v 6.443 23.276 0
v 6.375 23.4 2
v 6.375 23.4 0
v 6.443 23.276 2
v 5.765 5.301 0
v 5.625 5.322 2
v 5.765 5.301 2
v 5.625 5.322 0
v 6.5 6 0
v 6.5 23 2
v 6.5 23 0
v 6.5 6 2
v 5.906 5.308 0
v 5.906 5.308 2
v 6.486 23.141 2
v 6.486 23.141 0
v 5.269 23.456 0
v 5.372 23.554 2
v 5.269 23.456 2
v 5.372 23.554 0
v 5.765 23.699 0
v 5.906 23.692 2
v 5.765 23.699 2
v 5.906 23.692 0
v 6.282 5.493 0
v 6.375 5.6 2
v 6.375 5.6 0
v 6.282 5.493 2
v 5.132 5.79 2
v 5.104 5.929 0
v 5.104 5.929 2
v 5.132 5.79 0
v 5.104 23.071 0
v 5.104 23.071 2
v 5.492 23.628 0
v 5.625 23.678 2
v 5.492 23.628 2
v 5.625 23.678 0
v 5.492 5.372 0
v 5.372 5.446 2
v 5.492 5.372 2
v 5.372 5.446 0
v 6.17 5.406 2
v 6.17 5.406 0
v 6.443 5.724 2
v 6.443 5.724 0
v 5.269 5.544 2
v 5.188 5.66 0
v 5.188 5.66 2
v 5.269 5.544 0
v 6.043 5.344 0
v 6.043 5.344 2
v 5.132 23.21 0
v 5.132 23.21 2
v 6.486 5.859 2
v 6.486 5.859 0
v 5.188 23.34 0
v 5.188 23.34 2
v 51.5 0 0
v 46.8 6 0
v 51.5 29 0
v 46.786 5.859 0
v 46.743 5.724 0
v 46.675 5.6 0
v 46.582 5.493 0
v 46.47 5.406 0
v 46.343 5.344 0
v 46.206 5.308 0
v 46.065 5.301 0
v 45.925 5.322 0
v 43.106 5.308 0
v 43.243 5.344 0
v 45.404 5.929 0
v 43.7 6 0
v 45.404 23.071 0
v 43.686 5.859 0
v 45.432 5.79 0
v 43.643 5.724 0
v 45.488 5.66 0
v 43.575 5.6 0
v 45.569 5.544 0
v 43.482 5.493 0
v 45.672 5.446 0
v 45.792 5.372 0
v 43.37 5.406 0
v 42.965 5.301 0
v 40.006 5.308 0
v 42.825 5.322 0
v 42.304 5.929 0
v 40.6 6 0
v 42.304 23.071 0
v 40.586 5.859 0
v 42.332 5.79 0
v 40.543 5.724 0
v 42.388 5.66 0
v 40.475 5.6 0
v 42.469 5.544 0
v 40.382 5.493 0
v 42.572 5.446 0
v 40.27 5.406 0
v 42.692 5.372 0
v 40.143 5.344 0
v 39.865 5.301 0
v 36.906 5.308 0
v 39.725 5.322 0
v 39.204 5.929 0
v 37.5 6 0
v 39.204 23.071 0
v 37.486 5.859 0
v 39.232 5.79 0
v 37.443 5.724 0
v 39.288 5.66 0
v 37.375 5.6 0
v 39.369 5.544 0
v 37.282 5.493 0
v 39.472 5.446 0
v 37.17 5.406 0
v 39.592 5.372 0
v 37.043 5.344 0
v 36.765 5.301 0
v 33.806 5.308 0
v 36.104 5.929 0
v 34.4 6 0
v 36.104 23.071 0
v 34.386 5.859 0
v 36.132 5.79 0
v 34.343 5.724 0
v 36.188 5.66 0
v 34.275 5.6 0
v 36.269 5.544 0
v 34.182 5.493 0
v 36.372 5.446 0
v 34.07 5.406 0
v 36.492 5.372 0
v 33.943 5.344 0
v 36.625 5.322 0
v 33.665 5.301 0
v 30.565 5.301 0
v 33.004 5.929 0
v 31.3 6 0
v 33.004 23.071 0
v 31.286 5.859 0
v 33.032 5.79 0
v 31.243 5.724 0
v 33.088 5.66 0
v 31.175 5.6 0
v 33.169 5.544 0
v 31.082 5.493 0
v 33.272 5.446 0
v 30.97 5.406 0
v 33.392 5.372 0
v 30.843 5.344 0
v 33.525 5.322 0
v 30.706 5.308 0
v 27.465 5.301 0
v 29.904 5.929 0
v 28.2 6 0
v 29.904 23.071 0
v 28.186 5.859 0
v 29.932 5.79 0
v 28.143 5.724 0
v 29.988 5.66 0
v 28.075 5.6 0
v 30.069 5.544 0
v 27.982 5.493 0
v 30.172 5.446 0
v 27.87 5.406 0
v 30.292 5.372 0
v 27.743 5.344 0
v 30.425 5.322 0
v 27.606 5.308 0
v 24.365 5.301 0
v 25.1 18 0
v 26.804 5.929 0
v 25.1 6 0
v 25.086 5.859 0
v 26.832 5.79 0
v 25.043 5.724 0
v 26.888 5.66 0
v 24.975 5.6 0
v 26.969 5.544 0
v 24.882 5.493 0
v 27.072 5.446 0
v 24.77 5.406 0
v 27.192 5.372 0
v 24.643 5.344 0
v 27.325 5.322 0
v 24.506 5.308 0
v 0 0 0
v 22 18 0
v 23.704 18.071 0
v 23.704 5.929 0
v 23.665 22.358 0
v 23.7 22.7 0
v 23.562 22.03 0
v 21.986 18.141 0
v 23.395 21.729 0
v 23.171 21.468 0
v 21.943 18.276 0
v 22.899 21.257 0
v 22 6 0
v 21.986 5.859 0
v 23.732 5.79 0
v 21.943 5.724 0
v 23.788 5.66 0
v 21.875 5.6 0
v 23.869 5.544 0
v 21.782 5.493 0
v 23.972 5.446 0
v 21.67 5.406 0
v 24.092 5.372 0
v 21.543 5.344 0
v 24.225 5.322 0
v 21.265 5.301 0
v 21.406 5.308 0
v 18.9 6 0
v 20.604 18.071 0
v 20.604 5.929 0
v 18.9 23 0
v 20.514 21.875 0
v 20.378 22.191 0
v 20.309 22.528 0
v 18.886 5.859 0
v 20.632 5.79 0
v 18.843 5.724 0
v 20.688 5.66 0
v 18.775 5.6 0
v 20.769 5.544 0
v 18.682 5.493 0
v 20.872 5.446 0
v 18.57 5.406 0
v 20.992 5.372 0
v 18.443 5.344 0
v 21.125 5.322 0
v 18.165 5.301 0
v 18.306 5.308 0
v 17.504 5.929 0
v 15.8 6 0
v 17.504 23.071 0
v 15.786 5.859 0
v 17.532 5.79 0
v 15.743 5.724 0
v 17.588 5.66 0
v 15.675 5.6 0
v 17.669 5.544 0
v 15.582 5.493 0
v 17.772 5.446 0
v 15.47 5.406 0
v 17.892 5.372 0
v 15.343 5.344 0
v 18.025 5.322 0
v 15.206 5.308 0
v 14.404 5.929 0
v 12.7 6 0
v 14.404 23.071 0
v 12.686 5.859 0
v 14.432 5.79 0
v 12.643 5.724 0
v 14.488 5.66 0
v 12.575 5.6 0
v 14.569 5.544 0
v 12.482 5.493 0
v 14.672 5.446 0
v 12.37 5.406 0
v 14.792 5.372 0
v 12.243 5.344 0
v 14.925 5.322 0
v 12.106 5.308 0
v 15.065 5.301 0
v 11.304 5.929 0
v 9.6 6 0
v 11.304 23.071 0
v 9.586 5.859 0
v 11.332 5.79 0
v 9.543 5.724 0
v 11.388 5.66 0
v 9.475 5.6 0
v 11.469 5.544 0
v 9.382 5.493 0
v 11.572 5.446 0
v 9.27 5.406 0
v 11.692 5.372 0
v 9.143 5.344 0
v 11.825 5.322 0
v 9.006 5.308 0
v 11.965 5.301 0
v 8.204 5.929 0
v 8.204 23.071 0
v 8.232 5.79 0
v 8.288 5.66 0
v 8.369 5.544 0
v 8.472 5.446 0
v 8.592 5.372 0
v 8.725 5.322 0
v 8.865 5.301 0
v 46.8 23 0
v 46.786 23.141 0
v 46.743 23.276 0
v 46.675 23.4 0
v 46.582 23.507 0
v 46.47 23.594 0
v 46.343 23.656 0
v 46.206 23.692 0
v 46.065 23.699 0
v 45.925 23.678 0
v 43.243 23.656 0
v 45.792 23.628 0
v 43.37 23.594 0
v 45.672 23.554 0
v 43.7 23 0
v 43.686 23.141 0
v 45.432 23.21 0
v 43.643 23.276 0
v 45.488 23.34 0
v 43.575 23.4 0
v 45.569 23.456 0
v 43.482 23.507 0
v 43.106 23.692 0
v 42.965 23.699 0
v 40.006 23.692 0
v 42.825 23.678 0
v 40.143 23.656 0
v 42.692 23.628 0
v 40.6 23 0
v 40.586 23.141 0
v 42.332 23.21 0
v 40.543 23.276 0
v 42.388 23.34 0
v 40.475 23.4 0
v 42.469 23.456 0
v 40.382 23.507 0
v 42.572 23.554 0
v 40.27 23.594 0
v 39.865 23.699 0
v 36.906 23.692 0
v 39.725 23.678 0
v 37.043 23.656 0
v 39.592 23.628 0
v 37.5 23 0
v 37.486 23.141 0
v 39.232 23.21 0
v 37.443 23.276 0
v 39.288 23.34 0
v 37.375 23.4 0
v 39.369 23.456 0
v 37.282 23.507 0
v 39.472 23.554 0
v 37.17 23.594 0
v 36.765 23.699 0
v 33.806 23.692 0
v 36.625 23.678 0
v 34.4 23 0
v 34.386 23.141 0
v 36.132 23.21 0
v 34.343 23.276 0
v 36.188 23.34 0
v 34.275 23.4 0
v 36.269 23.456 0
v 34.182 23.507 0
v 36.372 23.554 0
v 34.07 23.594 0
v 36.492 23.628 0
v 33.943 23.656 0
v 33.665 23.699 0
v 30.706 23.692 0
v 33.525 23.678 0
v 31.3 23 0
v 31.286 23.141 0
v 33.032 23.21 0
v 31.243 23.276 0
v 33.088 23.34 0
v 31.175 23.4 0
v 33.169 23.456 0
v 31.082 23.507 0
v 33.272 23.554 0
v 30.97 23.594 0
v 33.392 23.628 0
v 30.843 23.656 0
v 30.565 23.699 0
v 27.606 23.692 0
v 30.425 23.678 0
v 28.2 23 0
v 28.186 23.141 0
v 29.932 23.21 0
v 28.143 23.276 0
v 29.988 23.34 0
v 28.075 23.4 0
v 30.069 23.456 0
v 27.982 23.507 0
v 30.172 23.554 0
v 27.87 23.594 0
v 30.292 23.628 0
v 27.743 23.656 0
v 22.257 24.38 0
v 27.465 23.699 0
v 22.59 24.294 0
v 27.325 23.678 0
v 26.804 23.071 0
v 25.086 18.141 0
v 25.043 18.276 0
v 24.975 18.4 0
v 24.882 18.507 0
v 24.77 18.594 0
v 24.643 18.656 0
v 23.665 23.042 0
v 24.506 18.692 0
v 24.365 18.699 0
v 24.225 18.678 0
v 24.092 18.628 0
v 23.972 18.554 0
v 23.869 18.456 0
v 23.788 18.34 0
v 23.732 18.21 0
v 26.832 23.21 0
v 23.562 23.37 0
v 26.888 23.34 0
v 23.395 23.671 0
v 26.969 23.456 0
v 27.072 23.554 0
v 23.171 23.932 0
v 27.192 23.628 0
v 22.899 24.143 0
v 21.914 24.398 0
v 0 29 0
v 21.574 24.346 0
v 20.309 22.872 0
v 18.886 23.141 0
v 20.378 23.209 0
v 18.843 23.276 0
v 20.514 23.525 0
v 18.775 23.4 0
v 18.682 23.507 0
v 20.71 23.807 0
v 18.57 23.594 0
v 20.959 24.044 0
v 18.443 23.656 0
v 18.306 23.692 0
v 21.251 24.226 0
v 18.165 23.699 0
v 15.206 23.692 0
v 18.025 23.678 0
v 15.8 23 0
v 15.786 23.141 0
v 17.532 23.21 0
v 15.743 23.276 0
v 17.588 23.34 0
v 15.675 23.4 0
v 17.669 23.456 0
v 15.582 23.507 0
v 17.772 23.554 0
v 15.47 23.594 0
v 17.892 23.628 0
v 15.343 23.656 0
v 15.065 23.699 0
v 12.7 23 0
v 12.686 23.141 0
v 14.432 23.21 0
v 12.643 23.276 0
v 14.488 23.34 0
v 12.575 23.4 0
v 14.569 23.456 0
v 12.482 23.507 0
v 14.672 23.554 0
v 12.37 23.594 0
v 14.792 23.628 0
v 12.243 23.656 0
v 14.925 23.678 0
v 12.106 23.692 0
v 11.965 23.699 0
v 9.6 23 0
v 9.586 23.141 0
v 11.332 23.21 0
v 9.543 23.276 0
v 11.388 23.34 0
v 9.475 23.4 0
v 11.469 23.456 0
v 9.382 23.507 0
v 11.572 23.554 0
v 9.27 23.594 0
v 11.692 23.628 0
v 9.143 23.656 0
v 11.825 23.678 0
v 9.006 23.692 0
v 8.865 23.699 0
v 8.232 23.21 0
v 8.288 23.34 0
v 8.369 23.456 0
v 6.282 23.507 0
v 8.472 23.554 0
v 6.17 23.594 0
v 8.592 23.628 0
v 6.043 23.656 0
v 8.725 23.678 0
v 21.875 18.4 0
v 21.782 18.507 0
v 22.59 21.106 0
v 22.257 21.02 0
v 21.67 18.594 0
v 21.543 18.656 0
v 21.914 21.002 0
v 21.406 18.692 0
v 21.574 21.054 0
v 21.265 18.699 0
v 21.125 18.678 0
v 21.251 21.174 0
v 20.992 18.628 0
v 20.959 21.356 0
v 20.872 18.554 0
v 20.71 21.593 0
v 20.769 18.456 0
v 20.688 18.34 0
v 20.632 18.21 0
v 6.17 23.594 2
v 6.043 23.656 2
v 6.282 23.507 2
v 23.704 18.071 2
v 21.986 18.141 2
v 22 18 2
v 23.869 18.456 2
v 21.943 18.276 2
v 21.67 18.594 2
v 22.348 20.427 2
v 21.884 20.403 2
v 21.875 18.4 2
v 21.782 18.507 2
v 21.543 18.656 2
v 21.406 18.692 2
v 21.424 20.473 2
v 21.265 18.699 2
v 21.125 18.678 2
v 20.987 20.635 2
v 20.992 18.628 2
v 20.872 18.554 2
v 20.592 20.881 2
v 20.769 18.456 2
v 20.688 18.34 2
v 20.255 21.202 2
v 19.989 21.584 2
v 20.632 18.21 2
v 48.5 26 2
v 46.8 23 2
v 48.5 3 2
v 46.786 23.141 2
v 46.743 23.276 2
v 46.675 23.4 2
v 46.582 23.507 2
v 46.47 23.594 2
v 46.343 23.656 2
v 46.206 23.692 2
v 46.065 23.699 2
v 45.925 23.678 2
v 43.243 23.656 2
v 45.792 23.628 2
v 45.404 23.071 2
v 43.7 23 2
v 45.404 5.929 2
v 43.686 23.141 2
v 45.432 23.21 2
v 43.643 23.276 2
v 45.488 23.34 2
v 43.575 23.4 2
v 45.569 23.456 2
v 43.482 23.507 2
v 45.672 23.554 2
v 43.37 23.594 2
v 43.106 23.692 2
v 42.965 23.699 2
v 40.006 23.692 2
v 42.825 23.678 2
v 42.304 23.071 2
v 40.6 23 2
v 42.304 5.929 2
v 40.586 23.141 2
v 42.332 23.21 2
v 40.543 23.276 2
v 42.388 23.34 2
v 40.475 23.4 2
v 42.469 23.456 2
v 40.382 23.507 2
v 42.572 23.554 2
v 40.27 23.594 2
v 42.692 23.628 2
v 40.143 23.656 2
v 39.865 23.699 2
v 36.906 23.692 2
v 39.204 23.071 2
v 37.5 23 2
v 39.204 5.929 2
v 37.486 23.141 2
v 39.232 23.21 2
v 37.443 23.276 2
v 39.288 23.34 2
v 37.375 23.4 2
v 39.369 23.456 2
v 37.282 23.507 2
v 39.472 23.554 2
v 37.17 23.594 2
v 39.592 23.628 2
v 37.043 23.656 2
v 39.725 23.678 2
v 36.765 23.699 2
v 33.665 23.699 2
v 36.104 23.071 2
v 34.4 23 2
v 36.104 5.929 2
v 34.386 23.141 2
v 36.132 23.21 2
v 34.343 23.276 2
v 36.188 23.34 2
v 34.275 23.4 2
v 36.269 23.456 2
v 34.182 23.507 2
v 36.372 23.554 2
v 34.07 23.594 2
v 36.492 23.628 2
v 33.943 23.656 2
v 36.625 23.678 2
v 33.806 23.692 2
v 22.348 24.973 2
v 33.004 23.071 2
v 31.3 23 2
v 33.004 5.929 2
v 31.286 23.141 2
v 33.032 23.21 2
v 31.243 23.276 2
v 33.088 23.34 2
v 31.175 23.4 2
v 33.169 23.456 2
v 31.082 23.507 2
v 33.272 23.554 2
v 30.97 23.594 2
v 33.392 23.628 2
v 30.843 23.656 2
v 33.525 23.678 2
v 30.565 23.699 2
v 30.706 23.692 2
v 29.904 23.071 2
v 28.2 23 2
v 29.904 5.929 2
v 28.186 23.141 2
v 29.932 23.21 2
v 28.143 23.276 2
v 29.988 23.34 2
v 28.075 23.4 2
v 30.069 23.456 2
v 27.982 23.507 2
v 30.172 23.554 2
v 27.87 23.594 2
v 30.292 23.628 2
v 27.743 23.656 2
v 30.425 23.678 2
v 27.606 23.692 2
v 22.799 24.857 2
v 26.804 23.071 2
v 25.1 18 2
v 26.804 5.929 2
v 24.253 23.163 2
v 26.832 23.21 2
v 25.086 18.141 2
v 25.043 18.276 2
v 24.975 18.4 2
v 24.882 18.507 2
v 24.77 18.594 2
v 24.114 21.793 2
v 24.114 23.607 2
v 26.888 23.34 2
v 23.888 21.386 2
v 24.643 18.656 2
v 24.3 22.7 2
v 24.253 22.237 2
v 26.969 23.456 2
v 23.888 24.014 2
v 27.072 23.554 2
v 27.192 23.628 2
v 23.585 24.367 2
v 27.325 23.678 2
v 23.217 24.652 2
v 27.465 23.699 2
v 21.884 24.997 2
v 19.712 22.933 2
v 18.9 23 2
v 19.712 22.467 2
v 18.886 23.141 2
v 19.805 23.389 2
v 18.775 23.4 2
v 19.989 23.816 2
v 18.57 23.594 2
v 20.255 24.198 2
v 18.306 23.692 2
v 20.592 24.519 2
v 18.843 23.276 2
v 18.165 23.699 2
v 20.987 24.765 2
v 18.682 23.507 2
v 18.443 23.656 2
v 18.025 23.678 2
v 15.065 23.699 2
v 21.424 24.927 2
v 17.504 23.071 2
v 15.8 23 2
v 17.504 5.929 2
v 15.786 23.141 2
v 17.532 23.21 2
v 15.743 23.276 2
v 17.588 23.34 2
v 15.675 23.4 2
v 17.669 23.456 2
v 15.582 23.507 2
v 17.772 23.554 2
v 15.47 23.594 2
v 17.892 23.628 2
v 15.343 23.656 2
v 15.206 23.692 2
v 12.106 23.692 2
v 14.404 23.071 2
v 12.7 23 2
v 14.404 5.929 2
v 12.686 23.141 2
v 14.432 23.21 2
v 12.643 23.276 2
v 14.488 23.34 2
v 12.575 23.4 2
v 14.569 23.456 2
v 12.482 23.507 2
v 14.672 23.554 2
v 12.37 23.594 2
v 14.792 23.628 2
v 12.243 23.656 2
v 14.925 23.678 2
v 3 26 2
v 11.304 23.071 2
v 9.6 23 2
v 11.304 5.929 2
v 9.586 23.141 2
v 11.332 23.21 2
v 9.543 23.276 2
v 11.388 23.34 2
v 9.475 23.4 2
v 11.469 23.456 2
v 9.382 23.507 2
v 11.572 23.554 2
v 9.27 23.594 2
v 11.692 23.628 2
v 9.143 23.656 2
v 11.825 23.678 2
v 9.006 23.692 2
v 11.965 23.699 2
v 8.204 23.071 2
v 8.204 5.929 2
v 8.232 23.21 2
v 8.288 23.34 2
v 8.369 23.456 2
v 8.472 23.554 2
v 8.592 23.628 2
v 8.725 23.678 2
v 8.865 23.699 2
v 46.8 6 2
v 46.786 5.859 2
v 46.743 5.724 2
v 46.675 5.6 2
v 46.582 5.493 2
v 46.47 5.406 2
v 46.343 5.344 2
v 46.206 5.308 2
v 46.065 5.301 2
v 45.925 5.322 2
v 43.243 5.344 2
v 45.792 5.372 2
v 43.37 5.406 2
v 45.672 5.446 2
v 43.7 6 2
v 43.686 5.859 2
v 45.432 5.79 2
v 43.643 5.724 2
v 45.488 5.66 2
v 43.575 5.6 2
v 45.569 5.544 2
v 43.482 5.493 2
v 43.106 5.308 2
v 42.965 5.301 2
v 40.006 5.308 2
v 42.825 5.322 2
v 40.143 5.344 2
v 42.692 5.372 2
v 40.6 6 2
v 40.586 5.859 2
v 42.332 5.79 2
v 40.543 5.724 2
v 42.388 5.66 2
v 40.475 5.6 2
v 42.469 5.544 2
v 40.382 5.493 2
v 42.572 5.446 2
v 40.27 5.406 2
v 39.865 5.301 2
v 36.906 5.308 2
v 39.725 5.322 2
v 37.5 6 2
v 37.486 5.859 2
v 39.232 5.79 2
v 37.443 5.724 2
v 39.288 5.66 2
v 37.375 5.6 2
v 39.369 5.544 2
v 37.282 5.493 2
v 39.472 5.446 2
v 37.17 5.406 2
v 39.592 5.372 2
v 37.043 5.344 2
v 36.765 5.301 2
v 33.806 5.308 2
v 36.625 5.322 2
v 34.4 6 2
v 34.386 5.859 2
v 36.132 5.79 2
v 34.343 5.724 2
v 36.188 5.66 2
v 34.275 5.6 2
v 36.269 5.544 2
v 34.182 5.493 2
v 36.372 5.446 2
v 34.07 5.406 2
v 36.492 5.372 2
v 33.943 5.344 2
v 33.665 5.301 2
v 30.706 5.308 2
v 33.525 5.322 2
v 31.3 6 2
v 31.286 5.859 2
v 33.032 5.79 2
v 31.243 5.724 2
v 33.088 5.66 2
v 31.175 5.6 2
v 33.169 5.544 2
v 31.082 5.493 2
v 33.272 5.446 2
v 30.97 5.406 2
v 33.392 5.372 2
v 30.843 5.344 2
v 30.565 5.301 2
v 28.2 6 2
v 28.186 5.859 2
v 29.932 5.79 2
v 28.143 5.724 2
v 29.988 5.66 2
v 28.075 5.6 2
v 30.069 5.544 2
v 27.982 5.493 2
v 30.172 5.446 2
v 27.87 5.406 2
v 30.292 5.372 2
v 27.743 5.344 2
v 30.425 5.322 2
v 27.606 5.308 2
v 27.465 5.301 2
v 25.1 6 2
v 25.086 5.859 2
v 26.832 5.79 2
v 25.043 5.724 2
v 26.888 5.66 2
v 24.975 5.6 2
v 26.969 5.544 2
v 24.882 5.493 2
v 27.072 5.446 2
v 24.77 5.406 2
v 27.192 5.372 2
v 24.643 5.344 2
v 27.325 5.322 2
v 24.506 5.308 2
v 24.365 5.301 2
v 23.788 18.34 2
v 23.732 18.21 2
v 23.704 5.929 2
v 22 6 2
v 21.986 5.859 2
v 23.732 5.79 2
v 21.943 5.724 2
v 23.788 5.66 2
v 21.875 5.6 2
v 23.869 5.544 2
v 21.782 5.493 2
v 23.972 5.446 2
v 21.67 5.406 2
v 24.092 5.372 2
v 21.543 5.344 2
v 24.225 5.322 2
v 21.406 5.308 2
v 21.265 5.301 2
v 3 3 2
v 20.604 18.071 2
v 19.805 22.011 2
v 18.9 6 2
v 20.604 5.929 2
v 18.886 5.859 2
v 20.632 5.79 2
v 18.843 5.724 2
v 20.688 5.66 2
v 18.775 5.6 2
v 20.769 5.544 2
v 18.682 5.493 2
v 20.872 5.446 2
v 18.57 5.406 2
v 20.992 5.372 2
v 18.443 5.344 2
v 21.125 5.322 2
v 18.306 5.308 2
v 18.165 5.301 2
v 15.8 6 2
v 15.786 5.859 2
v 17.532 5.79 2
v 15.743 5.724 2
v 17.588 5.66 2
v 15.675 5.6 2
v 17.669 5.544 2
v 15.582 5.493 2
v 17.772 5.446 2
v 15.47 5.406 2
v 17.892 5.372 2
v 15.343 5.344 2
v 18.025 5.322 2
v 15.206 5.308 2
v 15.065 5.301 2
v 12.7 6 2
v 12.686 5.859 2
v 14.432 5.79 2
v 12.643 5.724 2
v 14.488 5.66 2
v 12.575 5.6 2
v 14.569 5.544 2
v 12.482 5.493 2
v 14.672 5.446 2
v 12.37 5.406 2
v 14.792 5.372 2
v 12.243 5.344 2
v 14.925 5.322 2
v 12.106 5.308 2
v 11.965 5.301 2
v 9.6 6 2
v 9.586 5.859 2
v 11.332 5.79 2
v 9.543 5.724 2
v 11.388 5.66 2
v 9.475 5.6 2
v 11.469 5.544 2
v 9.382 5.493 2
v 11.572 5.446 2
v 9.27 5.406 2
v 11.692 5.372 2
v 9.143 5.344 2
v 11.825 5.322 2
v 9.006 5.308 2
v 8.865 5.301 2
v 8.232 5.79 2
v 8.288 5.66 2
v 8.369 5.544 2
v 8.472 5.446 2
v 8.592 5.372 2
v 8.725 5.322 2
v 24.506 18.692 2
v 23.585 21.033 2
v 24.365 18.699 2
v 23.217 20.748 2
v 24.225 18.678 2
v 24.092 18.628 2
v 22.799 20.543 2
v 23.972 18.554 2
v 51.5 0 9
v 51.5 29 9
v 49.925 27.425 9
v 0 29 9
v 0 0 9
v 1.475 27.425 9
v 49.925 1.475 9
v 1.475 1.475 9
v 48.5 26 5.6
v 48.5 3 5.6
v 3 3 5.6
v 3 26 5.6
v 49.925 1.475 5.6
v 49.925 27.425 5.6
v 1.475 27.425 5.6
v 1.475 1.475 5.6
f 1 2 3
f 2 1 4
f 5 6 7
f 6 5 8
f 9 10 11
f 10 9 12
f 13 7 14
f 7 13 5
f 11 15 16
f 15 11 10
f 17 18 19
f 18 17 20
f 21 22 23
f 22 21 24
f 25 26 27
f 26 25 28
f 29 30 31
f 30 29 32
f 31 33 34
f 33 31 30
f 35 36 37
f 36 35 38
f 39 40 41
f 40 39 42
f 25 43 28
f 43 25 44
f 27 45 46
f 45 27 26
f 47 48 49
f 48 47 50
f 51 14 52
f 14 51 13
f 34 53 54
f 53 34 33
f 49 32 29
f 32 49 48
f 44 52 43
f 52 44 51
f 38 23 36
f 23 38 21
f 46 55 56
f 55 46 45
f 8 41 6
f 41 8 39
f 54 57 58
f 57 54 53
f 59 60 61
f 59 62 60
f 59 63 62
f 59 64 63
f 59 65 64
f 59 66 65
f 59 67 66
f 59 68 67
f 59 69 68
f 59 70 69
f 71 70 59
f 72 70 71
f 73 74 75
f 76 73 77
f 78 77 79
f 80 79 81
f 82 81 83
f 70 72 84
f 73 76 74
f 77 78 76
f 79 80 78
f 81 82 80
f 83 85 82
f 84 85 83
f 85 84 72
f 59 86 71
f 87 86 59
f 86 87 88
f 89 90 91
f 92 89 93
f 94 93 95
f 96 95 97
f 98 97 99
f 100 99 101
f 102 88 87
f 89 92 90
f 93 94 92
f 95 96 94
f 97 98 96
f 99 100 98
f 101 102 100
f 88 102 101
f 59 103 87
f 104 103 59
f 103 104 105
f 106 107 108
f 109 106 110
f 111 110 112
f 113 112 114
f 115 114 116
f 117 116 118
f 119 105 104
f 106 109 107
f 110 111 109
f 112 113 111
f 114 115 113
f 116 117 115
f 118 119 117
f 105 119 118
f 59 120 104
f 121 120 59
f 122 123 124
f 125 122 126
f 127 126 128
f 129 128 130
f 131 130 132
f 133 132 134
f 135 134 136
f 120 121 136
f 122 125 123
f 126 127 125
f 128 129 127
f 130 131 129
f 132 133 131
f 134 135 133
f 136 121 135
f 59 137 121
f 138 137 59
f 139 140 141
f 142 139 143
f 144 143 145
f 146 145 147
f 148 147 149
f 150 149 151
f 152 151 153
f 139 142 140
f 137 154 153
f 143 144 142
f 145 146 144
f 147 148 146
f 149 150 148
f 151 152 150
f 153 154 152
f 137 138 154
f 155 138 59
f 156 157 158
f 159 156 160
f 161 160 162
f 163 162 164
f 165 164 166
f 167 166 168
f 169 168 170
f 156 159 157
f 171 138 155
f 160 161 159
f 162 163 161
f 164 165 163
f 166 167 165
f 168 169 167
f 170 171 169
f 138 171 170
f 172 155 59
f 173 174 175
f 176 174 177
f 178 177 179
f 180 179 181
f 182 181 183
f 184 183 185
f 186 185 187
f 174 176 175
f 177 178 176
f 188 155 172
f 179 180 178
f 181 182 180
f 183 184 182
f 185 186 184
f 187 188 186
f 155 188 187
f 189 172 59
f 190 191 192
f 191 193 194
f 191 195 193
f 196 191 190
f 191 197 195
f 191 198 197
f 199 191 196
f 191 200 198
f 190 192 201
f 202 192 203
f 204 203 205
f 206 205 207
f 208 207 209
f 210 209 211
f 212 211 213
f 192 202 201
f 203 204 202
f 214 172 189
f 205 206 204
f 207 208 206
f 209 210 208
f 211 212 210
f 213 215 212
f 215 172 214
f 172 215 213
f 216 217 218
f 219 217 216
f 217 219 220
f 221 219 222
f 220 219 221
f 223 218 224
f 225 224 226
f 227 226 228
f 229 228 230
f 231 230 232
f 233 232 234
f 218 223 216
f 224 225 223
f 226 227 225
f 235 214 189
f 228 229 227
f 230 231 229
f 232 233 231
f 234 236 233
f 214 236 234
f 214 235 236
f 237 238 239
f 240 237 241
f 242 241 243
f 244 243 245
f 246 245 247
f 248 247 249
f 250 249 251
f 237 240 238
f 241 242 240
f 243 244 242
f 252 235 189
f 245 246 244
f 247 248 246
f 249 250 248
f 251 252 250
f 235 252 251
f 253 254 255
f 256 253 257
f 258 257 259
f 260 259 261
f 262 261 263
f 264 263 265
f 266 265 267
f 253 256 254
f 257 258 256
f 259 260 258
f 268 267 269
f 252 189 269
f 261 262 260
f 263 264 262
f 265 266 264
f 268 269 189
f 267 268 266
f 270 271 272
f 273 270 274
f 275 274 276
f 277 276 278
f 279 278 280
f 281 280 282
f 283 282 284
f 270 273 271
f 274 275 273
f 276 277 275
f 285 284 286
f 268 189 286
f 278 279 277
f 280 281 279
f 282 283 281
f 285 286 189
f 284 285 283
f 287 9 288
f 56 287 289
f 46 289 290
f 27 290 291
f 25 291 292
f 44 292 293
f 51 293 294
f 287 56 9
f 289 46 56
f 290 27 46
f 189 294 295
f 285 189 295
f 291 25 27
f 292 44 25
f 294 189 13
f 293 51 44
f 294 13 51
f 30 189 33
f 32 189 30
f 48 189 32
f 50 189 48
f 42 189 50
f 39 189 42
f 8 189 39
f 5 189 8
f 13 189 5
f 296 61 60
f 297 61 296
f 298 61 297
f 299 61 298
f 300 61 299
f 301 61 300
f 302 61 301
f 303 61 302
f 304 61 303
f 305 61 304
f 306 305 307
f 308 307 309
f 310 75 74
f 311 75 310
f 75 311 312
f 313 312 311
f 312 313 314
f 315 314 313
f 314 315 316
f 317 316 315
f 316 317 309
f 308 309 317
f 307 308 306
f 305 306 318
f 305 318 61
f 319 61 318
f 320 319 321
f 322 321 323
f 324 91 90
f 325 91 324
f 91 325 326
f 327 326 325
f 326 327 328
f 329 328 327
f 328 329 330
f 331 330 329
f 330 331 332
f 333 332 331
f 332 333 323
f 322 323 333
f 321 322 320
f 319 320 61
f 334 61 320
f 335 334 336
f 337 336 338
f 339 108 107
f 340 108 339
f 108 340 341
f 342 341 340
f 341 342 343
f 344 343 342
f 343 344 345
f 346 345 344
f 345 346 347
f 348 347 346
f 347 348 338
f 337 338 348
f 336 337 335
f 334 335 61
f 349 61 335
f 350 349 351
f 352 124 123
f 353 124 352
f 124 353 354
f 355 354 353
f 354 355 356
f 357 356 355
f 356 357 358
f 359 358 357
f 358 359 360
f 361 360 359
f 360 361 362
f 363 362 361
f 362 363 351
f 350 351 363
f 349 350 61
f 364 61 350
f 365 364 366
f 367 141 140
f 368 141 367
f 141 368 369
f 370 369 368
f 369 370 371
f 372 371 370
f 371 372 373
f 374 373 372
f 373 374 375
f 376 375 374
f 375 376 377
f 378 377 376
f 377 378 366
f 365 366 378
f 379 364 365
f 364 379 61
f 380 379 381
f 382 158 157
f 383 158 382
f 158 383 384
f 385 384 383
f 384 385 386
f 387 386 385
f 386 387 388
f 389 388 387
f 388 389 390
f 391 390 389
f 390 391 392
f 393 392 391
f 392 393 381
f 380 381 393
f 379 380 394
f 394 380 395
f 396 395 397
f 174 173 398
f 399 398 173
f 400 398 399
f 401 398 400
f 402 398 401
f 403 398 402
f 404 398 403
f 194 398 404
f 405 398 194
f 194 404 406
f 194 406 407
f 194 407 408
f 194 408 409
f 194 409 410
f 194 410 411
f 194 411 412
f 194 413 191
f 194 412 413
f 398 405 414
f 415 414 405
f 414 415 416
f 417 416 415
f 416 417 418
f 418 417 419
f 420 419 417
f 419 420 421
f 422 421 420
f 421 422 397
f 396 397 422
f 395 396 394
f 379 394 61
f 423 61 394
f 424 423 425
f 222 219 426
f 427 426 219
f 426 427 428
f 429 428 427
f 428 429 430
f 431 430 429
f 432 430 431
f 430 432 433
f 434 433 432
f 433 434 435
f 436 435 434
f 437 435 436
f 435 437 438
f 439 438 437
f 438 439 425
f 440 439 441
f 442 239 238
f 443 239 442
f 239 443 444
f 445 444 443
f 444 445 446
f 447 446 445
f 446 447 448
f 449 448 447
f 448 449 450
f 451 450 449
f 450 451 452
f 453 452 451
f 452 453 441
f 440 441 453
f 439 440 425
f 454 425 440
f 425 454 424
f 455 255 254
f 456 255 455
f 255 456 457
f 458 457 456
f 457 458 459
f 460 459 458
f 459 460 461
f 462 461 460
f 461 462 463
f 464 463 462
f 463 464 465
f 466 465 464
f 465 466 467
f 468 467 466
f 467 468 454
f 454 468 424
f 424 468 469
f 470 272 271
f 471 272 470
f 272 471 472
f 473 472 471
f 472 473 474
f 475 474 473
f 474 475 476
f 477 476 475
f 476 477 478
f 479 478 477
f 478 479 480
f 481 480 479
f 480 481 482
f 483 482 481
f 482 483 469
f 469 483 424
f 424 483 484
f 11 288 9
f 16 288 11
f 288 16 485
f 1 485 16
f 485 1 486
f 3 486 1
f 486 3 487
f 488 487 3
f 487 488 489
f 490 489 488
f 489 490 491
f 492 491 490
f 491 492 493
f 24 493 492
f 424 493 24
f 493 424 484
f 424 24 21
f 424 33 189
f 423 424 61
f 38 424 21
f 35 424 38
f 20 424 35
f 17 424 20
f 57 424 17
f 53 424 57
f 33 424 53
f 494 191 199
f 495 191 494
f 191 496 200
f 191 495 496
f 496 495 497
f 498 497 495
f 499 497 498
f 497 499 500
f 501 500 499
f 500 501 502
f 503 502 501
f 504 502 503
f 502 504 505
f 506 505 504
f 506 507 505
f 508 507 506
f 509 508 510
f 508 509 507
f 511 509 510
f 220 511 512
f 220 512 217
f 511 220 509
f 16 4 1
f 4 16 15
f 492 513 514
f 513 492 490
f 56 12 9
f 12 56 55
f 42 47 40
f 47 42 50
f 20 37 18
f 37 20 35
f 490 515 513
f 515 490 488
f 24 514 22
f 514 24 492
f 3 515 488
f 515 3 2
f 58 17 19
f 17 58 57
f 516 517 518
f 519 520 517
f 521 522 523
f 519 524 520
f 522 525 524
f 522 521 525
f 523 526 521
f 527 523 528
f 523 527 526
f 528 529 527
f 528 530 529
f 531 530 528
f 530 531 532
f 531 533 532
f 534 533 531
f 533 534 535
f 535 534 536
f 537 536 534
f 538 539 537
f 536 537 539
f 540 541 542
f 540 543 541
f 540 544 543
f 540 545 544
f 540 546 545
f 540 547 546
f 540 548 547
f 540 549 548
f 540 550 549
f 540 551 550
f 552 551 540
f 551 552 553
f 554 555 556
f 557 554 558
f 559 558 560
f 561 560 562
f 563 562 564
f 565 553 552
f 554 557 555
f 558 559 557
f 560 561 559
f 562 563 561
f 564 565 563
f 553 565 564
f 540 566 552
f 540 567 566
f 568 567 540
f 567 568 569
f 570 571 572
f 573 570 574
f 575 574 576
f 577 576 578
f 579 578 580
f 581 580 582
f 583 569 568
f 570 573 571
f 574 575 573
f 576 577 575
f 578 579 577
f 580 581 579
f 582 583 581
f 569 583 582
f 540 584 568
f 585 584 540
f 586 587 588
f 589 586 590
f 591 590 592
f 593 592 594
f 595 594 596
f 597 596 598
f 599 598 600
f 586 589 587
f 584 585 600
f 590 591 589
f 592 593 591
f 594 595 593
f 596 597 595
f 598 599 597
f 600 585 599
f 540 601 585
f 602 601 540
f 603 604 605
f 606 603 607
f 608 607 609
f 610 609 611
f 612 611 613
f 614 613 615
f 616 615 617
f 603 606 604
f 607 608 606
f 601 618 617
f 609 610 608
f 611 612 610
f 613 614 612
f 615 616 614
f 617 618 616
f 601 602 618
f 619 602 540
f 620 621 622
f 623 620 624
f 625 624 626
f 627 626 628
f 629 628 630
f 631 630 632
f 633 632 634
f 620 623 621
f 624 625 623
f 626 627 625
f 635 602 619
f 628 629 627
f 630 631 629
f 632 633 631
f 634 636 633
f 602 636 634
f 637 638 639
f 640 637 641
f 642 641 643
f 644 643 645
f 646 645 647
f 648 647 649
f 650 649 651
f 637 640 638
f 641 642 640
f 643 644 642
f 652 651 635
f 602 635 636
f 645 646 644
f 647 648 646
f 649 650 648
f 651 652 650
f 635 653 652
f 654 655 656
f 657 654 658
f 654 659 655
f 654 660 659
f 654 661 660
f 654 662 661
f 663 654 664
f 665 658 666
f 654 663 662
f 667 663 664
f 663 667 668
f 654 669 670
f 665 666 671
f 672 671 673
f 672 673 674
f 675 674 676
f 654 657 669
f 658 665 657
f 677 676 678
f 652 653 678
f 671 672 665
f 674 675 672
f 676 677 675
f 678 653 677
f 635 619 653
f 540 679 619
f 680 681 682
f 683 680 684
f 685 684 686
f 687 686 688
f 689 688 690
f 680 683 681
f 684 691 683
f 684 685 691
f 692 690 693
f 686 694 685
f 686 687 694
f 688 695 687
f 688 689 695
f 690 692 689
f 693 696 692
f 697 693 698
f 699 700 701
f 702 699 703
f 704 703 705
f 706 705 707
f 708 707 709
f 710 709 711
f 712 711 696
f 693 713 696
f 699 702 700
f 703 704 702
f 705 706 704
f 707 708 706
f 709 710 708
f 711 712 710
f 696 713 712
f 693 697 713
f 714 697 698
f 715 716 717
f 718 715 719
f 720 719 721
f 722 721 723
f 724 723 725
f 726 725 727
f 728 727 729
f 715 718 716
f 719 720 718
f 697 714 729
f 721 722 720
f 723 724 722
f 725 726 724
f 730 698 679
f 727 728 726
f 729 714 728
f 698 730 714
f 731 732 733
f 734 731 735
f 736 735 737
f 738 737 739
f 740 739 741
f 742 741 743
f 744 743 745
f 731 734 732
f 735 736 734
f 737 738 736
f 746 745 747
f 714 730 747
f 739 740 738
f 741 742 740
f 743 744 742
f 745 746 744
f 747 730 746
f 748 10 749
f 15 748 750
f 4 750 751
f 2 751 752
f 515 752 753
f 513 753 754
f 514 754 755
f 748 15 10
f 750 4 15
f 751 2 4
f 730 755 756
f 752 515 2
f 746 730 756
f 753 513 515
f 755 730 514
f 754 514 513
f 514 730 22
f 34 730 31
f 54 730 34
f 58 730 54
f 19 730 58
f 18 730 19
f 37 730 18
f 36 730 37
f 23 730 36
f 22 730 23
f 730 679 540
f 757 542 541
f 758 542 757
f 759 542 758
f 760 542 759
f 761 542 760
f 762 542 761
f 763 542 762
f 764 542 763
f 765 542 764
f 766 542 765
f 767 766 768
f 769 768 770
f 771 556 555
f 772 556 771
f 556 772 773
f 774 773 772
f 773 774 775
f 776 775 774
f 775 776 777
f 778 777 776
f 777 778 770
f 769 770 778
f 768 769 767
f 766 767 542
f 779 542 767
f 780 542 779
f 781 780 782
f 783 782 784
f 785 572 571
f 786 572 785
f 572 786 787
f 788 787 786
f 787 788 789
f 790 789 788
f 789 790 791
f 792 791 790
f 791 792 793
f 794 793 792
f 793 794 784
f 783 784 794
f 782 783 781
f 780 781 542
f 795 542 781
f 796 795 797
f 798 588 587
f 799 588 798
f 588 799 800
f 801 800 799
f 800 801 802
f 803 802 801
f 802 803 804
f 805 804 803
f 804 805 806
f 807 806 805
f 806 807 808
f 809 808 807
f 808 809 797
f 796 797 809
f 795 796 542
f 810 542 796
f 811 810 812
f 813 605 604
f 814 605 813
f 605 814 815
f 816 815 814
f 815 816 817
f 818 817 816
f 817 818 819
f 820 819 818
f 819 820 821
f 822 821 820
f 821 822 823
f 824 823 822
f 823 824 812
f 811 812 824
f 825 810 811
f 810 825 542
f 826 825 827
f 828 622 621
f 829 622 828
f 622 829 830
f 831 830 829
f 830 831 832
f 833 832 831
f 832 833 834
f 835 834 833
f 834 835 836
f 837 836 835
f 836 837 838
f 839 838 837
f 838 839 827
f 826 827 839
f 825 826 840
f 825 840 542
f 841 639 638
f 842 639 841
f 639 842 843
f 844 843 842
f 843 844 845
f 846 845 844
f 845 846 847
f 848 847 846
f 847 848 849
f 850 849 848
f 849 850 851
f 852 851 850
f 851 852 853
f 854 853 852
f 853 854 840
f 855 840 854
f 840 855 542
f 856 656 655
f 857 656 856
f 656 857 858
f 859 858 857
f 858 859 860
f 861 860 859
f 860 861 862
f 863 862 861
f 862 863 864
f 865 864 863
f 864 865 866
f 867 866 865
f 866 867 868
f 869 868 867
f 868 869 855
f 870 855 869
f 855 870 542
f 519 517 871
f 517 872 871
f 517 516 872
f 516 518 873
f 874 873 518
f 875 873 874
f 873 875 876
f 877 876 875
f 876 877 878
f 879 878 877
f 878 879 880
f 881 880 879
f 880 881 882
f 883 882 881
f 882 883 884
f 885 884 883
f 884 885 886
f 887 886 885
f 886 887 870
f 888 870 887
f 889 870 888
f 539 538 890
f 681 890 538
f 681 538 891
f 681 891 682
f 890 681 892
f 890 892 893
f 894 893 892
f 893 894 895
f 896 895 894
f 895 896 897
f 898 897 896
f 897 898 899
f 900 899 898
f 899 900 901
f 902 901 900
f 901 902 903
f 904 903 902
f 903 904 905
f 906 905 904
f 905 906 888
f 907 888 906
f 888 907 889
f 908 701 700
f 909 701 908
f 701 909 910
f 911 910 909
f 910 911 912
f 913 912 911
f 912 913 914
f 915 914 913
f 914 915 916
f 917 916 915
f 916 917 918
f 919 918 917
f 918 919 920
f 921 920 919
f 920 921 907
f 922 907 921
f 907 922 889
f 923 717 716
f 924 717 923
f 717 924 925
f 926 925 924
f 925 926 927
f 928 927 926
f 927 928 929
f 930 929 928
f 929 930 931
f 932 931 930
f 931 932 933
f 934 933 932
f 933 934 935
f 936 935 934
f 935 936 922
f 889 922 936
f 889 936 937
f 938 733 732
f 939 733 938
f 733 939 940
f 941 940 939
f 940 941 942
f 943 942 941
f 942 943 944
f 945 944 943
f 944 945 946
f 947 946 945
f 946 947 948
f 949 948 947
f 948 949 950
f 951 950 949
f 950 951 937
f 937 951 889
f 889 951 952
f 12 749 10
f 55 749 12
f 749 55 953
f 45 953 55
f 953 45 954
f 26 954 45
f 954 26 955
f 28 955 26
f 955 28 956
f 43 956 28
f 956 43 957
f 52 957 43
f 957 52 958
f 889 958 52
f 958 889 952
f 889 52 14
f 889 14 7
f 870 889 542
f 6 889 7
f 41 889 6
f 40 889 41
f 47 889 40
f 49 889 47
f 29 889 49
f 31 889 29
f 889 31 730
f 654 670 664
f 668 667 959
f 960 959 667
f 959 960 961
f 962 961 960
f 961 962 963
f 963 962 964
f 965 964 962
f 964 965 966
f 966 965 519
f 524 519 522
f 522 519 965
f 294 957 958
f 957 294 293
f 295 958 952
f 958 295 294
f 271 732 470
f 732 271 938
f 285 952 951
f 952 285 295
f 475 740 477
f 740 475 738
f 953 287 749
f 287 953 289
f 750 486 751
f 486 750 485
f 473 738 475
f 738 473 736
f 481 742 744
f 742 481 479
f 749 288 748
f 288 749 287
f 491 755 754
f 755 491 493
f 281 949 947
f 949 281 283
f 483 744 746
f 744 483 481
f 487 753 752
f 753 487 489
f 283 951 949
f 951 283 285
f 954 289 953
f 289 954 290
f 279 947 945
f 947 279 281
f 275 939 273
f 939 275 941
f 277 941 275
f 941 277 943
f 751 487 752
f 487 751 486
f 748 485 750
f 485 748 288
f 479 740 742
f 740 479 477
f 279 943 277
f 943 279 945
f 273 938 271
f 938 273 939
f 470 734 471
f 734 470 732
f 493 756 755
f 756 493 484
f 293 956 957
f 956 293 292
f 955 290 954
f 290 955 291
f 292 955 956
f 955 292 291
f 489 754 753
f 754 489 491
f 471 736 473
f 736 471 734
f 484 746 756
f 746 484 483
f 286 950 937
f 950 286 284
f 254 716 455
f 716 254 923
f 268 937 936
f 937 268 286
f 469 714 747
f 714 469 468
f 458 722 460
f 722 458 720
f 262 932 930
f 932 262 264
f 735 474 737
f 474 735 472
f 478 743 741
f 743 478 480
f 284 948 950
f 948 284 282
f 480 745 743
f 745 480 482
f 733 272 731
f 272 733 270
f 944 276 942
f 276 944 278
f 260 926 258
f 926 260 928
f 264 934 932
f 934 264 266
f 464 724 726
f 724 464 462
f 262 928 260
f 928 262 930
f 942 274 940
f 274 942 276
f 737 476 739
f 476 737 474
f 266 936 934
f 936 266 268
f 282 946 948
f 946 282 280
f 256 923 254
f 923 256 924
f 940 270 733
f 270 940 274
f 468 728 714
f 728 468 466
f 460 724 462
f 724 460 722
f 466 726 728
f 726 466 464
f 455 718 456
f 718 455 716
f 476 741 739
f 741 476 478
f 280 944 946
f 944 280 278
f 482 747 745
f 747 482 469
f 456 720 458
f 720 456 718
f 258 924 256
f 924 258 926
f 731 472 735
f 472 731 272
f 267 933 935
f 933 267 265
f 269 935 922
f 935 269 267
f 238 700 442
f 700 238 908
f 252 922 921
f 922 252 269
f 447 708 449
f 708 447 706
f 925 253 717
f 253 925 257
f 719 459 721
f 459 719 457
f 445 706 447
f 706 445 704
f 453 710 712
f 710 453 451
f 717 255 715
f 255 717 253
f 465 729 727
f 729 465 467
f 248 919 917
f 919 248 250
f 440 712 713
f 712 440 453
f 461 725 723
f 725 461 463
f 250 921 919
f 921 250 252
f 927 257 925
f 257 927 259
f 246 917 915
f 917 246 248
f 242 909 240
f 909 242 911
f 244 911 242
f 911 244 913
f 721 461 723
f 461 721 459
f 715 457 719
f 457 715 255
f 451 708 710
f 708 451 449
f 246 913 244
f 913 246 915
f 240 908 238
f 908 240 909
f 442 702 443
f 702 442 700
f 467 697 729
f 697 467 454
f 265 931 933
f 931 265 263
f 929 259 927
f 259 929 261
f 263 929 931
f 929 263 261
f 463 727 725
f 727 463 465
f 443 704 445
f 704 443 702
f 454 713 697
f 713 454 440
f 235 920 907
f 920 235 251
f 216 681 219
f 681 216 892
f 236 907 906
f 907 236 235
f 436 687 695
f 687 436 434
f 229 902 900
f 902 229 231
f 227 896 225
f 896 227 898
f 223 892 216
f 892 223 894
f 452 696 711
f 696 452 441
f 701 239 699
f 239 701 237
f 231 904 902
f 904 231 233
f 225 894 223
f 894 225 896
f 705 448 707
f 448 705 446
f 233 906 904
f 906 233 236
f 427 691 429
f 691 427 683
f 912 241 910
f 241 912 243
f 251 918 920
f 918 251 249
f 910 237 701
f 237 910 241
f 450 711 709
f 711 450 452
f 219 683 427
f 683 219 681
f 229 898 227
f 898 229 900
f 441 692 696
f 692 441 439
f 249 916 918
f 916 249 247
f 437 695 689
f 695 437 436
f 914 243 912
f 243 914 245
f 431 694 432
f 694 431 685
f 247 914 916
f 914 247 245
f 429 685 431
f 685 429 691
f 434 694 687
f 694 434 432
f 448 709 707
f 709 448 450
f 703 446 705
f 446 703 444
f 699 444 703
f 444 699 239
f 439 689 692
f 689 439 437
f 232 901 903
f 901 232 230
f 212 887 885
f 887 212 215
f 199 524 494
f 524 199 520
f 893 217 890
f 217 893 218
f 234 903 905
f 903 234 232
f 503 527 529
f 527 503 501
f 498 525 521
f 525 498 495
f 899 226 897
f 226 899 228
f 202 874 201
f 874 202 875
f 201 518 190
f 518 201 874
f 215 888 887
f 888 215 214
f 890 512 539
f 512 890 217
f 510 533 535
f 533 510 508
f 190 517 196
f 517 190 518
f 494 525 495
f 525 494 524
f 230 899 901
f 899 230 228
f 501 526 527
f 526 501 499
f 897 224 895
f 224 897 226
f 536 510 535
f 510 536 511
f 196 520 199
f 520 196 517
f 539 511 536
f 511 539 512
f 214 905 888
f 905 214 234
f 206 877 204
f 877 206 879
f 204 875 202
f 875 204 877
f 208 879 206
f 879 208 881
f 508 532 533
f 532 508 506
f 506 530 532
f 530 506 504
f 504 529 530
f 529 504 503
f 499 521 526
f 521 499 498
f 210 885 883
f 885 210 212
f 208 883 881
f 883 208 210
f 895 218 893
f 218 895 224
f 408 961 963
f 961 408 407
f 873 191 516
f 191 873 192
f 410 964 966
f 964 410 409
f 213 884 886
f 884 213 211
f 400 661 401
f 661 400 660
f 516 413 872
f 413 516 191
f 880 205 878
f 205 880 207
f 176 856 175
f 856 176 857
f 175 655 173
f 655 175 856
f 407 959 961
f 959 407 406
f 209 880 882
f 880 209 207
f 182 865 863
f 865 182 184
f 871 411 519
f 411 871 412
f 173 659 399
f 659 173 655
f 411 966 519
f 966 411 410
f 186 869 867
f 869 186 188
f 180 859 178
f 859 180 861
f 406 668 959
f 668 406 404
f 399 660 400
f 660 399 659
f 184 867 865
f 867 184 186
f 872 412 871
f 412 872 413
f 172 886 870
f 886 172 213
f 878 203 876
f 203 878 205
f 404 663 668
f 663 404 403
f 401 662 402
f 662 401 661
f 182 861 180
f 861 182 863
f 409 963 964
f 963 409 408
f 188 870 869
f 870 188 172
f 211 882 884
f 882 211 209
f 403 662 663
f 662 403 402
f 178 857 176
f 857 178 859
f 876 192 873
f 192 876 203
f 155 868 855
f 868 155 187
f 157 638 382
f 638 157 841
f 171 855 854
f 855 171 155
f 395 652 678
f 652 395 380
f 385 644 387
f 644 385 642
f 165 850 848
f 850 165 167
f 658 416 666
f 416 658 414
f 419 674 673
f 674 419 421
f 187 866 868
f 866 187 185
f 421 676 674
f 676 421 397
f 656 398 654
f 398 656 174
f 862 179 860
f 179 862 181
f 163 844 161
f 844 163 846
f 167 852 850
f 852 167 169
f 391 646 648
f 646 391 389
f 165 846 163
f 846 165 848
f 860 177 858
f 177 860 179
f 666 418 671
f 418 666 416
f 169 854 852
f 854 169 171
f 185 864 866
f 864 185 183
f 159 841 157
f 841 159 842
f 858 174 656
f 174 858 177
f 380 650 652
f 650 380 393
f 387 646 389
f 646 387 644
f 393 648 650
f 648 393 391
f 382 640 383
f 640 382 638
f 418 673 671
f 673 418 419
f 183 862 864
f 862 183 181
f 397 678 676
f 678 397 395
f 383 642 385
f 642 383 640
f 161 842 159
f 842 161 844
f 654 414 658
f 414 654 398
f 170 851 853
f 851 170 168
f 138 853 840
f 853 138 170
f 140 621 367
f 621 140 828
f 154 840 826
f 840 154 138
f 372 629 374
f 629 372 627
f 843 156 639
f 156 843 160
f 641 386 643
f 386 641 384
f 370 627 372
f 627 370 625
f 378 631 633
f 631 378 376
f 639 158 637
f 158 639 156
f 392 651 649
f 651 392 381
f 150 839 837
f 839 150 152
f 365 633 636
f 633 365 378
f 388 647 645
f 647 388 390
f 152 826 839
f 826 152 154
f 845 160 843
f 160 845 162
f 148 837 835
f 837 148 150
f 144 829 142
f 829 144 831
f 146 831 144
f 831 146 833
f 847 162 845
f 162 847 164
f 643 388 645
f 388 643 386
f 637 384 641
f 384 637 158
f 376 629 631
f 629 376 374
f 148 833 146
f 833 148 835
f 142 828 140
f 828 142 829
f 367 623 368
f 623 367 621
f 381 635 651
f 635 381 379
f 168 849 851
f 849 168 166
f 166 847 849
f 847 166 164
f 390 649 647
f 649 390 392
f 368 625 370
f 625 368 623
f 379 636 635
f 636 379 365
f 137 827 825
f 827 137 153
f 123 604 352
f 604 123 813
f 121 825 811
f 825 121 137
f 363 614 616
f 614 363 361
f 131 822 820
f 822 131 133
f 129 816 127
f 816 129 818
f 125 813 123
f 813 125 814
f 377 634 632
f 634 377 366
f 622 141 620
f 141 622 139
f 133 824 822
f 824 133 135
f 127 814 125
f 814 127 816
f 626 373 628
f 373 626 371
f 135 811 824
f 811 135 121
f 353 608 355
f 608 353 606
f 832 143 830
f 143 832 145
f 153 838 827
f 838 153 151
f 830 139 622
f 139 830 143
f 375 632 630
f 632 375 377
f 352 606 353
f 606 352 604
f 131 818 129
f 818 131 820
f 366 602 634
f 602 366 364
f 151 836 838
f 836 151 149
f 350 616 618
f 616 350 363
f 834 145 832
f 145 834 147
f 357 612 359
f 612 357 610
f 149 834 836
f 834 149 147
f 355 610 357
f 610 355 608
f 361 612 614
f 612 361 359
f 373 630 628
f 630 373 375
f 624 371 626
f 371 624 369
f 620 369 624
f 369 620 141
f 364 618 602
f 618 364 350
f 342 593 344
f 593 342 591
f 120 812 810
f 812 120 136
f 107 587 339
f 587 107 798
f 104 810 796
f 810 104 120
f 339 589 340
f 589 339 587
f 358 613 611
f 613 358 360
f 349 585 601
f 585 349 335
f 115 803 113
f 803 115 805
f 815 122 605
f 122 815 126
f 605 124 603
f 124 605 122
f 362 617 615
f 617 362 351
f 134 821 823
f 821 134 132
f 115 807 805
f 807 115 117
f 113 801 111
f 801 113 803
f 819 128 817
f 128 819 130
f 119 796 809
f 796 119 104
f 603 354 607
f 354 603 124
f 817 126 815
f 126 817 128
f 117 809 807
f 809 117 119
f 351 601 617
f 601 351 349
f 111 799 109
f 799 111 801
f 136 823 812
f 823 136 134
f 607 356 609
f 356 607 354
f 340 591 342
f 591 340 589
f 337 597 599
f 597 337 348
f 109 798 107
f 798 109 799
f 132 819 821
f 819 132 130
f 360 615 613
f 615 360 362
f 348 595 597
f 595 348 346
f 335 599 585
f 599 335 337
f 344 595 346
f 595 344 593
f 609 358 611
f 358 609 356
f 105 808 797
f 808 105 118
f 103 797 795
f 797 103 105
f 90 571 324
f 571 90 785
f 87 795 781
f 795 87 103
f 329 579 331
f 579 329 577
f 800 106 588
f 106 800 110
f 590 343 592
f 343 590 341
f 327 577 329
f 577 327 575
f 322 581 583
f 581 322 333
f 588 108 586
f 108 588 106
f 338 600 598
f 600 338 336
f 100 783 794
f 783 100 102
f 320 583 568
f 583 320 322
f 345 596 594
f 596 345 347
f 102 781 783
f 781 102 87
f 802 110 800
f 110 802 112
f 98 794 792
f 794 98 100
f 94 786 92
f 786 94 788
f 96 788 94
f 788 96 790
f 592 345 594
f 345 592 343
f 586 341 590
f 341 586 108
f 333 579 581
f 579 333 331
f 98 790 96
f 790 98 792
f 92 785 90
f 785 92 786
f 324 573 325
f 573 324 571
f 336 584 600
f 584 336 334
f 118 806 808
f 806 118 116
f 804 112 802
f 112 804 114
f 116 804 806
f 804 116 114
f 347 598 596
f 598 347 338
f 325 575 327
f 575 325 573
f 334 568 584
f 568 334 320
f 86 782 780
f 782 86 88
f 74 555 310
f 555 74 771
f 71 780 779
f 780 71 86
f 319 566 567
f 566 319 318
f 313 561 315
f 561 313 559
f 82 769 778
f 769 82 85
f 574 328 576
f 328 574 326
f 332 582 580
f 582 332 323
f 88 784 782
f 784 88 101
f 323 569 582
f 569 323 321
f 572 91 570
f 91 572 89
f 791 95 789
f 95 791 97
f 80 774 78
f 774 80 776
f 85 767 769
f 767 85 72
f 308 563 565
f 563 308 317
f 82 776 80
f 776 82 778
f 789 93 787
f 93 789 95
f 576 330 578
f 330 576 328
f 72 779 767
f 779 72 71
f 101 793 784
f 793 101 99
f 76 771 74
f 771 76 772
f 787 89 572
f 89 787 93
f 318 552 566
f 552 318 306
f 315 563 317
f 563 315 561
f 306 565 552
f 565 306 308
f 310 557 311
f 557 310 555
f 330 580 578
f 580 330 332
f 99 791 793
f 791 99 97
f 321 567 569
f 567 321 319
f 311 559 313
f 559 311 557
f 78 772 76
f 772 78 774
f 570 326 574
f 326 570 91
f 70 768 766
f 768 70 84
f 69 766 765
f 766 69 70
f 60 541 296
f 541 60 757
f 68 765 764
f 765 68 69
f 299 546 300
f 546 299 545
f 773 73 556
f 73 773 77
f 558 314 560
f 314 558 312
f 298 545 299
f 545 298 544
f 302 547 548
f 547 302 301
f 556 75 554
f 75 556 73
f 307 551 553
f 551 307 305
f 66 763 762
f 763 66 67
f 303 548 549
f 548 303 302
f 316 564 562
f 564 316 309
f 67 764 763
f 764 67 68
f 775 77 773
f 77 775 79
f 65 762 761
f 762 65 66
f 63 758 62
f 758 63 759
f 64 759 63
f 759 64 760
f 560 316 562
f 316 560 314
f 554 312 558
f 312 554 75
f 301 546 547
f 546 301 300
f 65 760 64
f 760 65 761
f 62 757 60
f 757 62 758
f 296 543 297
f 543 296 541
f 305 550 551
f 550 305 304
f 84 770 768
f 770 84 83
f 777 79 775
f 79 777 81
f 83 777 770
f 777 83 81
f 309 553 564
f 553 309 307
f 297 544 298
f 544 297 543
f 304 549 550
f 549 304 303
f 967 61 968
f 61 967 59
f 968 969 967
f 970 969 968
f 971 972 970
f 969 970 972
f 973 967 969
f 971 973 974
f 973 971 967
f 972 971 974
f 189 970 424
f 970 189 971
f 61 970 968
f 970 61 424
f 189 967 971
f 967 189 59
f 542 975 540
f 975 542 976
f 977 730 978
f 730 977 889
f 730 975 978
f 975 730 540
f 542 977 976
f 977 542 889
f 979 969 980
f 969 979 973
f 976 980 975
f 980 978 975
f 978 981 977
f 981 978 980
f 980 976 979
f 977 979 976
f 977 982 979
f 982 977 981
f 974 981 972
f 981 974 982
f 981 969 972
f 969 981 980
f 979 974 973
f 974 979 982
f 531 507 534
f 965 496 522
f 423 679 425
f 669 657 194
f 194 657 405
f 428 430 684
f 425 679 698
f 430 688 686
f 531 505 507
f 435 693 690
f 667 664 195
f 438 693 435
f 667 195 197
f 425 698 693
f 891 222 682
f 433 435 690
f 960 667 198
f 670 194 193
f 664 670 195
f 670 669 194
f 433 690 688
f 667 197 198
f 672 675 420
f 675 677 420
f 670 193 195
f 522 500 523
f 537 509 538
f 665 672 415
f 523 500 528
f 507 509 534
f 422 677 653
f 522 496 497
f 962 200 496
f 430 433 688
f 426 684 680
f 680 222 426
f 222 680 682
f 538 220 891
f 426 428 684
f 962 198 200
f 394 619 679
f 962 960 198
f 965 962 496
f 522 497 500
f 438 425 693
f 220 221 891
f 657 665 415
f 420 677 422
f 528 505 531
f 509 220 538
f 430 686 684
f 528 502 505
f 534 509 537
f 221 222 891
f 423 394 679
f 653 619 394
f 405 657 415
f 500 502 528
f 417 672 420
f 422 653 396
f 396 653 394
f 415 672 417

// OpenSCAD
/*
 * Friction-fit Chassis for LM2596-based buck converter
 *
 * Designed and written by Roy Sigurd Karlsbakk <roy@karlsbakk.net> 2024
 * Licensed under CC BY NC 4.0 https://creativecommons.org/licenses/by/4.0/
 */

debug = true;
idiot = $preview ? .5 : 0;
fn = $preview ? 12 : 31;

board_x = 43.5;
board_y = 21;
ol_height = 3; // overlapp
b_height = 9;
t_height = 16-b_height; // bare skruen stikker ut
walls = 3;
gap = 1;
bottom = 3;
top = 2;
hole_r = 1.5;
lh_width = 4; // lead hole
lh_height = 5.5; // lead hole
fitness_x = .05;
fitness_z = .4;
pot_x = 9.5;
pot_y = 4.5;
pot_z = 1.5;
b_wedge = 1.15;
t_wedge = .01;
w_wedge = 2;

module bottom() {
    difference() {
        cube([board_x+walls*2+gap*2,board_y+walls*2+gap*2,b_height+bottom]);
        translate([walls,walls,bottom]) {
            cube([board_x+gap*2,board_y+gap*2,b_height+idiot]);
        }
        translate([0,0,bottom+b_height-ol_height]) {
            difference() {
                cube([board_x+walls*2+gap*2,board_y+walls*2+gap*2,ol_height]);
                translate([walls/2,walls/2,0]) {
                    cube([board_x+walls+gap*2,board_y+walls+gap*2,ol_height]);
                }
            }
        }
        translate([0,walls+gap,bottom-1]) {
            cube([walls+5,lh_width,lh_height+1]);
        }
        translate([0,walls+board_y-lh_width+gap,bottom-1]) {
            cube([walls+5,lh_width,lh_height+1]);
        }
        translate([walls+board_x+gap*2-5,walls+gap,bottom-1]) {
            cube([walls+5,lh_width,lh_height+1]);
        }
        translate([walls+board_x+gap*2-5,walls+board_y-lh_width+gap,bottom-1]) {
            cube([walls+5,lh_width,lh_height+1]);
        }
        translate([walls+gap+23.8,walls+board_y+gap-pot_y,bottom-pot_z]) {
            cube([pot_x,pot_y,pot_z]);
        }
    }
    translate([walls+board_x*.15,walls,bottom]) {
        hull() {
            cube([w_wedge,b_wedge,t_wedge]);
            translate([0,0,b_height]) {
                cube([w_wedge,t_wedge,t_wedge]);
            }
        }
    }
    translate([walls+board_x*.85-1,walls,bottom]) {
        hull() {
            cube([w_wedge,b_wedge,t_wedge]);
            translate([0,0,b_height]) {
                cube([w_wedge,t_wedge,t_wedge]);
            }
        }
    }
    translate([walls+board_x*.15,board_y+walls+gap*2-b_wedge,bottom]) {
        hull() {
            cube([w_wedge,b_wedge,t_wedge]);
            translate([0,b_wedge,b_height]) {
                cube([w_wedge,t_wedge,t_wedge]);
            }
        }
    }
    translate([walls+board_x*.85-1,board_y+walls+gap*2-b_wedge,bottom]) {
        hull() {
            cube([w_wedge,b_wedge,t_wedge]);
            translate([0,b_wedge,b_height]) {
                cube([w_wedge,t_wedge,t_wedge]);
            }
        }
    }
    translate([walls,board_y/2+walls-w_wedge/2,bottom]) {
        hull() {
            cube([b_wedge,w_wedge,t_wedge]);
            translate([0,b_wedge,b_height]) {
                cube([t_wedge,w_wedge,t_wedge]);
            }
        }
    }
    translate([walls+board_x+gap*2-b_wedge,board_y/2+walls-w_wedge/2,bottom]) {
        hull() {
            cube([b_wedge,w_wedge,t_wedge]);
            translate([b_wedge,0,b_height]) {
                cube([t_wedge,w_wedge,t_wedge]);
            }
        }
    }
}

module top() {
    difference() {
        cube([board_x+walls*2+gap*2,board_y+walls*2+gap*2,t_height+top]);
        translate([walls,walls,top]) {
            cube([board_x+gap*2,board_y+gap*2,t_height+idiot]);
        }
        translate([walls/2-fitness_x/2,walls/2-fitness_x/2,top+t_height-ol_height-fitness_z]) {
            cube([board_x+walls+gap*2-fitness_x,board_y+walls+gap*2-fitness_x,ol_height+fitness_z]);
        }
        translate([walls+gap+18,walls+board_y+gap-2.3,0]) {
            cylinder(d1=3.4, d2=4.6, h=top+idiot, $fn=fn);
        }
        for (x=[walls*2-.2:3.1:board_x+walls]) {
            translate([x,walls*2,0]) {
                hull() {
                    corr = (x > 20 && x < 26) ? -5 : 0;
                    cylinder(h=top, r=.7, $fn=fn);
                    translate([0,17+corr,0]) {
                        cylinder(h=top, r=.7, $fn=fn);
                    }
                }
            }
        }
    }
}

/* Draw them */
//bottom();
top();
/*
translate([0,-32,0]) {
    top();
}
*/
